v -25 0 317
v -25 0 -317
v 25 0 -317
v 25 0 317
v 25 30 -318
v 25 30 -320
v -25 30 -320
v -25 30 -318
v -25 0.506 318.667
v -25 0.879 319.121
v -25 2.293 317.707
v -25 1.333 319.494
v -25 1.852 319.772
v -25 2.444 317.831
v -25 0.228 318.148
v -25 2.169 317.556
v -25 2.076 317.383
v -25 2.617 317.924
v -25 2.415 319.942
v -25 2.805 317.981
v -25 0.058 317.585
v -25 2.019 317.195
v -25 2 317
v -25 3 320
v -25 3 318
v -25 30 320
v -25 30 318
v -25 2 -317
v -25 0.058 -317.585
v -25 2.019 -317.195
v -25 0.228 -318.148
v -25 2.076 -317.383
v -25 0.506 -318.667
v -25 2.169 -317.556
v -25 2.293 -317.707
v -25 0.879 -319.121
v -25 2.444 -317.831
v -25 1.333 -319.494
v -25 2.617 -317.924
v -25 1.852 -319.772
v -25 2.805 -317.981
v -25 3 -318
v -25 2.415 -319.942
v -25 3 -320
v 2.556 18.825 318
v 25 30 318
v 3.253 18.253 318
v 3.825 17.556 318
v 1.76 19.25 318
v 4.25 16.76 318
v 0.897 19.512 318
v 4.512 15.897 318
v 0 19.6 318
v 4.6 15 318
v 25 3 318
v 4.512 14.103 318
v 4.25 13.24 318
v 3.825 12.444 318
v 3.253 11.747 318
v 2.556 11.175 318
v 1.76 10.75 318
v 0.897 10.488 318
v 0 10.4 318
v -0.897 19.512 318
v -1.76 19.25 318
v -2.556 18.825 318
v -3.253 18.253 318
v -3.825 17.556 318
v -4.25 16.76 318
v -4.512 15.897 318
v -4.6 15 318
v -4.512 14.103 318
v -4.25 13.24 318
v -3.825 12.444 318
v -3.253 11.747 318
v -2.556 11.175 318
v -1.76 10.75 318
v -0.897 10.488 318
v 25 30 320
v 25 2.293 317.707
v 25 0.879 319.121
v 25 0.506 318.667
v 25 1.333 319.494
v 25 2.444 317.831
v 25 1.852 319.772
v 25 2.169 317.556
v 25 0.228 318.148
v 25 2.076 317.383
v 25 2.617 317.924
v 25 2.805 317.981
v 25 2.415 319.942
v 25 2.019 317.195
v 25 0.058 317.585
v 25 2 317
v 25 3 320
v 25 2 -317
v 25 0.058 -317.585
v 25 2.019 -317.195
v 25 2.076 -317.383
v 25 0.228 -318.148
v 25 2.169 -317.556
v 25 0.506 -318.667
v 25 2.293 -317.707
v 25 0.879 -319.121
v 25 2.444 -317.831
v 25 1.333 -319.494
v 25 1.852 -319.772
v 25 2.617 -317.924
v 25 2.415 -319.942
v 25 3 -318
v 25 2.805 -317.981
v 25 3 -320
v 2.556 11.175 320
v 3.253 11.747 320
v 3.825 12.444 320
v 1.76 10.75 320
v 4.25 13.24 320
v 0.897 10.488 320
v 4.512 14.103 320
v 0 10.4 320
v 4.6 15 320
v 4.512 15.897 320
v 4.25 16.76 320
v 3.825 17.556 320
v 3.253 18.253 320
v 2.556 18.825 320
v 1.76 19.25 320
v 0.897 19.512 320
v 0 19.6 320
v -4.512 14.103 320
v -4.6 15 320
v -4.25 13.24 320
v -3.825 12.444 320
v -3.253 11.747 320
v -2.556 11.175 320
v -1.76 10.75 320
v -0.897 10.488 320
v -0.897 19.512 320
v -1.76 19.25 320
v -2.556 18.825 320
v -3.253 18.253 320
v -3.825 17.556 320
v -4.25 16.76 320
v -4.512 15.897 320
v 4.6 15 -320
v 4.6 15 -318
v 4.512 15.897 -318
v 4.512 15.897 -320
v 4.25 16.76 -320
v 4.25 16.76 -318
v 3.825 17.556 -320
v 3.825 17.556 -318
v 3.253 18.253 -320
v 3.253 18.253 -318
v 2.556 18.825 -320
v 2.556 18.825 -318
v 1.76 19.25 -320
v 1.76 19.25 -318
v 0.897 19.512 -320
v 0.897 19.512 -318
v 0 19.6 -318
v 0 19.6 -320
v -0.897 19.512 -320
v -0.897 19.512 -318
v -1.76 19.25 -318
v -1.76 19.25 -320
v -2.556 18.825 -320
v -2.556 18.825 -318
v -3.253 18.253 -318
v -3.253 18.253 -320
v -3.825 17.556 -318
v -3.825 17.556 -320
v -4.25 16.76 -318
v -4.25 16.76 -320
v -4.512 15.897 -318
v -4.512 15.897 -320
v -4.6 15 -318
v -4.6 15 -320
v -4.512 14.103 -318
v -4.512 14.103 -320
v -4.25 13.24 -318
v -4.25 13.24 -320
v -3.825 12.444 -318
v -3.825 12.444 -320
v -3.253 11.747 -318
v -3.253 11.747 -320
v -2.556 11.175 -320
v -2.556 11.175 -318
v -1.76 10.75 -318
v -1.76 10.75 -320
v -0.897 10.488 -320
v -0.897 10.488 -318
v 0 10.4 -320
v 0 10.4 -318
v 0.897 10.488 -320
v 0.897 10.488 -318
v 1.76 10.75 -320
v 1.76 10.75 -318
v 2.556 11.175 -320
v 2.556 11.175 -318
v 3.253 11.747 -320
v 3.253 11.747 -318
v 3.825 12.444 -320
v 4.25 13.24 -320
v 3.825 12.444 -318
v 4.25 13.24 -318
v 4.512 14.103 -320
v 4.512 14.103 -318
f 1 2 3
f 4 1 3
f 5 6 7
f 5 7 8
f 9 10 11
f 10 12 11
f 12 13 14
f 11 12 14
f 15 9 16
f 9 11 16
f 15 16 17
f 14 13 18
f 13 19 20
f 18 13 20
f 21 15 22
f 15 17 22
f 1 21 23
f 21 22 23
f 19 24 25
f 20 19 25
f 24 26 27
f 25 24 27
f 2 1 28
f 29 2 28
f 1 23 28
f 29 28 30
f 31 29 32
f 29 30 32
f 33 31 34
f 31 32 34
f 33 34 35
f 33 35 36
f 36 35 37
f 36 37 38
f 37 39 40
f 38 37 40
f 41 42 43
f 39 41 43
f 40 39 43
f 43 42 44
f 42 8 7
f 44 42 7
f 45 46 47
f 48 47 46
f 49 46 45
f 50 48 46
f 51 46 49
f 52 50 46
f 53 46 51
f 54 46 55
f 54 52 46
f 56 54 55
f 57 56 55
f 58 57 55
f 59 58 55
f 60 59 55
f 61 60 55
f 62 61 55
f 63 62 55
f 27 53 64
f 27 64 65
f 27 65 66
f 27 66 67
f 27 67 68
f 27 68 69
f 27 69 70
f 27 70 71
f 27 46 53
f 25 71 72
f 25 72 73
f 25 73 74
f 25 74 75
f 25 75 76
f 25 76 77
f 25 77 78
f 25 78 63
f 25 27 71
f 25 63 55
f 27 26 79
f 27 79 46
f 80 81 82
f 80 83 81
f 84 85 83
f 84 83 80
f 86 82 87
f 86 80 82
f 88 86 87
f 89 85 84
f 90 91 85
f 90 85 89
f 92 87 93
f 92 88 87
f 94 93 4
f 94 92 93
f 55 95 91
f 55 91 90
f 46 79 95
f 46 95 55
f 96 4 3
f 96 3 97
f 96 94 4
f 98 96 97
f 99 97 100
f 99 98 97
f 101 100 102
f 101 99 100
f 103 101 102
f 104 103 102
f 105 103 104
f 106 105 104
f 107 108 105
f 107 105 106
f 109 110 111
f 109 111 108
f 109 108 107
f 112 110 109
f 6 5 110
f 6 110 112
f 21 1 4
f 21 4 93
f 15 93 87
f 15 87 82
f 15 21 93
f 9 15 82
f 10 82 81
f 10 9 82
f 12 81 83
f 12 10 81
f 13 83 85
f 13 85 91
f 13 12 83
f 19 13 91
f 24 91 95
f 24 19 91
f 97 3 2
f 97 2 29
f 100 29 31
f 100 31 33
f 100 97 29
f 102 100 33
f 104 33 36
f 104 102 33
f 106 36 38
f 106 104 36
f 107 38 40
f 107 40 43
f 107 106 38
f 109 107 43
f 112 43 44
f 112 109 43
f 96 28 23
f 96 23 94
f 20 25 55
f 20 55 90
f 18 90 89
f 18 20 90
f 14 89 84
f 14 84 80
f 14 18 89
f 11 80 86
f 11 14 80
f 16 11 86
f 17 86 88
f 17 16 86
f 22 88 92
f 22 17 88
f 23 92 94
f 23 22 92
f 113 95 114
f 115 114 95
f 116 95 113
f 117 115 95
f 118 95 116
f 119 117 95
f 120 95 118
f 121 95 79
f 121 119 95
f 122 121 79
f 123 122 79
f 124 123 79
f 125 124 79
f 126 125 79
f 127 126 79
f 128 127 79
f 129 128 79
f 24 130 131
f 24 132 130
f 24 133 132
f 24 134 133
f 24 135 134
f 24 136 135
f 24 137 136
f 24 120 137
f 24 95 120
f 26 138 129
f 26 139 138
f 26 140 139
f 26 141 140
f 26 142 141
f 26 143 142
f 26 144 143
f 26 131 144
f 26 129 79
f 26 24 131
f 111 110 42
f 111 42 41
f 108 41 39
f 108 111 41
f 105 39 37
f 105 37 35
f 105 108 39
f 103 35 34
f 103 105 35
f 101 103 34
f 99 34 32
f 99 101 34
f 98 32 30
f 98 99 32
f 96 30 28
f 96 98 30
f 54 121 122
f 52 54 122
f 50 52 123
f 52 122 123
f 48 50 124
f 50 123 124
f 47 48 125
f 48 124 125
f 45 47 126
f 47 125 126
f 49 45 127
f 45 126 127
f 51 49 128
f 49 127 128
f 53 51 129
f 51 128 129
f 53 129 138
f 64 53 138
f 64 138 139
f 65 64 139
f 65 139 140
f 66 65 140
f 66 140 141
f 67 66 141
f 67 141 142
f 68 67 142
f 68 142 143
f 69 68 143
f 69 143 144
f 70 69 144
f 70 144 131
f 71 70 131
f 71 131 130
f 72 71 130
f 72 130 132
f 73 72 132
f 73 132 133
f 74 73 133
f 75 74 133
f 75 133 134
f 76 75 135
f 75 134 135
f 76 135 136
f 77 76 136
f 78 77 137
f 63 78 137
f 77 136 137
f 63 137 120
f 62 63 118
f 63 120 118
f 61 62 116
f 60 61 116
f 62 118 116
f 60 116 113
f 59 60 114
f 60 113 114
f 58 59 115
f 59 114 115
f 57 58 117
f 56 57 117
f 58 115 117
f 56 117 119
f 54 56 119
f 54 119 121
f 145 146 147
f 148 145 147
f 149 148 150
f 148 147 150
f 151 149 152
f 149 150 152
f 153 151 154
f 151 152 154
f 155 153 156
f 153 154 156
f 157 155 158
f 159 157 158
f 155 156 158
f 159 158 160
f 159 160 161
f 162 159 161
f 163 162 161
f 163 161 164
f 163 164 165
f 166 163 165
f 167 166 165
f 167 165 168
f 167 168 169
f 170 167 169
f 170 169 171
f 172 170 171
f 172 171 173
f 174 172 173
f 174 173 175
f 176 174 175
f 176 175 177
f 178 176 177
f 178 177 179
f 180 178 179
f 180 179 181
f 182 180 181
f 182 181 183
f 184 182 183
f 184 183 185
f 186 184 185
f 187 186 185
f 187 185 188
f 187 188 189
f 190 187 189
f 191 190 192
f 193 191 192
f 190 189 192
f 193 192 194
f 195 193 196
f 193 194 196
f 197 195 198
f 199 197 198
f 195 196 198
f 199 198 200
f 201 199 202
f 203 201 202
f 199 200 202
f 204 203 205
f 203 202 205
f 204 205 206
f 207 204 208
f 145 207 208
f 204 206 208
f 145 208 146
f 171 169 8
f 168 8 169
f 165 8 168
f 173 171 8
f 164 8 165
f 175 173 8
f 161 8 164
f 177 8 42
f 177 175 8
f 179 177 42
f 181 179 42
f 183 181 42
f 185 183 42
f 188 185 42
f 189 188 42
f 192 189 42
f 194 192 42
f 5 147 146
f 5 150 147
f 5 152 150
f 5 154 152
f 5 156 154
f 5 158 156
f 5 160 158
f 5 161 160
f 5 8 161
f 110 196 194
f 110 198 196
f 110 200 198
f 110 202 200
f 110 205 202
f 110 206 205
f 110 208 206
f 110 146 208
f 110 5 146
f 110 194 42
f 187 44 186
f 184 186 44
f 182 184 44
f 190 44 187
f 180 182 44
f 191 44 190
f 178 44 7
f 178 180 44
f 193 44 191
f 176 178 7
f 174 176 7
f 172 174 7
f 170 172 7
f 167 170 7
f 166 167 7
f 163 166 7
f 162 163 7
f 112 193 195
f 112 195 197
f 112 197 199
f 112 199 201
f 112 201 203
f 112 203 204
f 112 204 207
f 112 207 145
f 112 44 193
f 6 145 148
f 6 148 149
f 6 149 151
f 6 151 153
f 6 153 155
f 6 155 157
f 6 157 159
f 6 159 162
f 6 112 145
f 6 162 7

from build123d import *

# Parameters (mm, degrees)
BASEFLANGE_W                   = 50
BASEFLANGE_H                   = 640
BASE_FLANGE1_DEPTH             = 2
EDGE_FLANGE1_STRIP_W           = 10
EDGE_FLANGE1_STRIP_H           = 2
EDGE_FLANGE1_STRIP_CUT_DEPTH   = 50
EDGE_FLANGE1_STRIP_2_W         = 10
EDGE_FLANGE1_STRIP_2_H         = 2
EDGE_FLANGE1_STRIP_CUT_2_DEPTH = 50
EDGE_FLANGE1_DEPTH             = 50
EDGE_FLANGE1_BEND_DEPTH        = 50
SKETCH8_R                      = 4.6
EXTRUDE1_DEPTH                 = 642.190299365


# Sheet-metal steps are written as plain solids
with BuildPart() as part:
    # BaseFlange → Base-Flange1 (new body)
    with BuildSketch(Plane(origin=(0, 0, 0), x_dir=(1, 0, 0), z_dir=(0, 1, 0))):
        Rectangle(BASEFLANGE_W, BASEFLANGE_H)
    extrude(amount=BASE_FLANGE1_DEPTH)

    # Edge-Flange1 strip (across the edge) → Edge-Flange1 strip cut (cut)
    with BuildSketch(Plane(origin=(-25, 2, 320), x_dir=(0, 0, -1), z_dir=(1, 0, 0))):
        with Locations((-2, -1)):
            Rectangle(EDGE_FLANGE1_STRIP_W, EDGE_FLANGE1_STRIP_H)
    extrude(amount=EDGE_FLANGE1_STRIP_CUT_DEPTH, mode=Mode.SUBTRACT)

    # Edge-Flange1 strip 2 (across the edge) → Edge-Flange1 strip cut 2 (cut)
    with BuildSketch(Plane(origin=(25, 2, -320), x_dir=(0, 0, 1), z_dir=(-1, 0, 0))):
        with Locations((-2, -1)):
            Rectangle(EDGE_FLANGE1_STRIP_2_W, EDGE_FLANGE1_STRIP_2_H)
    extrude(amount=EDGE_FLANGE1_STRIP_CUT_2_DEPTH, mode=Mode.SUBTRACT)

    # Edge-Flange1 section (across the edge) → Edge-Flange1 (add)
    with BuildSketch(Plane(origin=(-25, 2, 320), x_dir=(0, 0, -1), z_dir=(1, 0, 0))):
        with BuildLine():
            Line((0, 1), (0, 28))
            Line((0, 28), (2, 28))
            Line((2, 28), (2, 1))
            ThreePointArc((2, 1), (2.292893219, 0.292893219), (3, 0))
            Line((3, 0), (3, -2))
            ThreePointArc((3, -2), (0.878679656, -1.121320344), (0, 1))
        make_face()
    extrude(amount=EDGE_FLANGE1_DEPTH)

    # Edge-Flange1 section 2 (across the edge) → Edge-Flange1 bend (add)
    with BuildSketch(Plane(origin=(25, 2, -320), x_dir=(0, 0, 1), z_dir=(-1, 0, 0))):
        with BuildLine():
            Line((0, 1), (0, 28))
            Line((0, 28), (2, 28))
            Line((2, 28), (2, 1))
            ThreePointArc((2, 1), (2.292893219, 0.292893219), (3, 0))
            Line((3, 0), (3, -2))
            ThreePointArc((3, -2), (0.878679656, -1.121320344), (0, 1))
        make_face()
    extrude(amount=EDGE_FLANGE1_BEND_DEPTH)

    # Sketch8 → Extrude1 (cut, through all)
    with BuildSketch(Plane.XY.offset(320)):
        with Locations((0, 15)):
            Circle(SKETCH8_R)
    extrude(amount=-EXTRUDE1_DEPTH, mode=Mode.SUBTRACT)


solid = part.part
